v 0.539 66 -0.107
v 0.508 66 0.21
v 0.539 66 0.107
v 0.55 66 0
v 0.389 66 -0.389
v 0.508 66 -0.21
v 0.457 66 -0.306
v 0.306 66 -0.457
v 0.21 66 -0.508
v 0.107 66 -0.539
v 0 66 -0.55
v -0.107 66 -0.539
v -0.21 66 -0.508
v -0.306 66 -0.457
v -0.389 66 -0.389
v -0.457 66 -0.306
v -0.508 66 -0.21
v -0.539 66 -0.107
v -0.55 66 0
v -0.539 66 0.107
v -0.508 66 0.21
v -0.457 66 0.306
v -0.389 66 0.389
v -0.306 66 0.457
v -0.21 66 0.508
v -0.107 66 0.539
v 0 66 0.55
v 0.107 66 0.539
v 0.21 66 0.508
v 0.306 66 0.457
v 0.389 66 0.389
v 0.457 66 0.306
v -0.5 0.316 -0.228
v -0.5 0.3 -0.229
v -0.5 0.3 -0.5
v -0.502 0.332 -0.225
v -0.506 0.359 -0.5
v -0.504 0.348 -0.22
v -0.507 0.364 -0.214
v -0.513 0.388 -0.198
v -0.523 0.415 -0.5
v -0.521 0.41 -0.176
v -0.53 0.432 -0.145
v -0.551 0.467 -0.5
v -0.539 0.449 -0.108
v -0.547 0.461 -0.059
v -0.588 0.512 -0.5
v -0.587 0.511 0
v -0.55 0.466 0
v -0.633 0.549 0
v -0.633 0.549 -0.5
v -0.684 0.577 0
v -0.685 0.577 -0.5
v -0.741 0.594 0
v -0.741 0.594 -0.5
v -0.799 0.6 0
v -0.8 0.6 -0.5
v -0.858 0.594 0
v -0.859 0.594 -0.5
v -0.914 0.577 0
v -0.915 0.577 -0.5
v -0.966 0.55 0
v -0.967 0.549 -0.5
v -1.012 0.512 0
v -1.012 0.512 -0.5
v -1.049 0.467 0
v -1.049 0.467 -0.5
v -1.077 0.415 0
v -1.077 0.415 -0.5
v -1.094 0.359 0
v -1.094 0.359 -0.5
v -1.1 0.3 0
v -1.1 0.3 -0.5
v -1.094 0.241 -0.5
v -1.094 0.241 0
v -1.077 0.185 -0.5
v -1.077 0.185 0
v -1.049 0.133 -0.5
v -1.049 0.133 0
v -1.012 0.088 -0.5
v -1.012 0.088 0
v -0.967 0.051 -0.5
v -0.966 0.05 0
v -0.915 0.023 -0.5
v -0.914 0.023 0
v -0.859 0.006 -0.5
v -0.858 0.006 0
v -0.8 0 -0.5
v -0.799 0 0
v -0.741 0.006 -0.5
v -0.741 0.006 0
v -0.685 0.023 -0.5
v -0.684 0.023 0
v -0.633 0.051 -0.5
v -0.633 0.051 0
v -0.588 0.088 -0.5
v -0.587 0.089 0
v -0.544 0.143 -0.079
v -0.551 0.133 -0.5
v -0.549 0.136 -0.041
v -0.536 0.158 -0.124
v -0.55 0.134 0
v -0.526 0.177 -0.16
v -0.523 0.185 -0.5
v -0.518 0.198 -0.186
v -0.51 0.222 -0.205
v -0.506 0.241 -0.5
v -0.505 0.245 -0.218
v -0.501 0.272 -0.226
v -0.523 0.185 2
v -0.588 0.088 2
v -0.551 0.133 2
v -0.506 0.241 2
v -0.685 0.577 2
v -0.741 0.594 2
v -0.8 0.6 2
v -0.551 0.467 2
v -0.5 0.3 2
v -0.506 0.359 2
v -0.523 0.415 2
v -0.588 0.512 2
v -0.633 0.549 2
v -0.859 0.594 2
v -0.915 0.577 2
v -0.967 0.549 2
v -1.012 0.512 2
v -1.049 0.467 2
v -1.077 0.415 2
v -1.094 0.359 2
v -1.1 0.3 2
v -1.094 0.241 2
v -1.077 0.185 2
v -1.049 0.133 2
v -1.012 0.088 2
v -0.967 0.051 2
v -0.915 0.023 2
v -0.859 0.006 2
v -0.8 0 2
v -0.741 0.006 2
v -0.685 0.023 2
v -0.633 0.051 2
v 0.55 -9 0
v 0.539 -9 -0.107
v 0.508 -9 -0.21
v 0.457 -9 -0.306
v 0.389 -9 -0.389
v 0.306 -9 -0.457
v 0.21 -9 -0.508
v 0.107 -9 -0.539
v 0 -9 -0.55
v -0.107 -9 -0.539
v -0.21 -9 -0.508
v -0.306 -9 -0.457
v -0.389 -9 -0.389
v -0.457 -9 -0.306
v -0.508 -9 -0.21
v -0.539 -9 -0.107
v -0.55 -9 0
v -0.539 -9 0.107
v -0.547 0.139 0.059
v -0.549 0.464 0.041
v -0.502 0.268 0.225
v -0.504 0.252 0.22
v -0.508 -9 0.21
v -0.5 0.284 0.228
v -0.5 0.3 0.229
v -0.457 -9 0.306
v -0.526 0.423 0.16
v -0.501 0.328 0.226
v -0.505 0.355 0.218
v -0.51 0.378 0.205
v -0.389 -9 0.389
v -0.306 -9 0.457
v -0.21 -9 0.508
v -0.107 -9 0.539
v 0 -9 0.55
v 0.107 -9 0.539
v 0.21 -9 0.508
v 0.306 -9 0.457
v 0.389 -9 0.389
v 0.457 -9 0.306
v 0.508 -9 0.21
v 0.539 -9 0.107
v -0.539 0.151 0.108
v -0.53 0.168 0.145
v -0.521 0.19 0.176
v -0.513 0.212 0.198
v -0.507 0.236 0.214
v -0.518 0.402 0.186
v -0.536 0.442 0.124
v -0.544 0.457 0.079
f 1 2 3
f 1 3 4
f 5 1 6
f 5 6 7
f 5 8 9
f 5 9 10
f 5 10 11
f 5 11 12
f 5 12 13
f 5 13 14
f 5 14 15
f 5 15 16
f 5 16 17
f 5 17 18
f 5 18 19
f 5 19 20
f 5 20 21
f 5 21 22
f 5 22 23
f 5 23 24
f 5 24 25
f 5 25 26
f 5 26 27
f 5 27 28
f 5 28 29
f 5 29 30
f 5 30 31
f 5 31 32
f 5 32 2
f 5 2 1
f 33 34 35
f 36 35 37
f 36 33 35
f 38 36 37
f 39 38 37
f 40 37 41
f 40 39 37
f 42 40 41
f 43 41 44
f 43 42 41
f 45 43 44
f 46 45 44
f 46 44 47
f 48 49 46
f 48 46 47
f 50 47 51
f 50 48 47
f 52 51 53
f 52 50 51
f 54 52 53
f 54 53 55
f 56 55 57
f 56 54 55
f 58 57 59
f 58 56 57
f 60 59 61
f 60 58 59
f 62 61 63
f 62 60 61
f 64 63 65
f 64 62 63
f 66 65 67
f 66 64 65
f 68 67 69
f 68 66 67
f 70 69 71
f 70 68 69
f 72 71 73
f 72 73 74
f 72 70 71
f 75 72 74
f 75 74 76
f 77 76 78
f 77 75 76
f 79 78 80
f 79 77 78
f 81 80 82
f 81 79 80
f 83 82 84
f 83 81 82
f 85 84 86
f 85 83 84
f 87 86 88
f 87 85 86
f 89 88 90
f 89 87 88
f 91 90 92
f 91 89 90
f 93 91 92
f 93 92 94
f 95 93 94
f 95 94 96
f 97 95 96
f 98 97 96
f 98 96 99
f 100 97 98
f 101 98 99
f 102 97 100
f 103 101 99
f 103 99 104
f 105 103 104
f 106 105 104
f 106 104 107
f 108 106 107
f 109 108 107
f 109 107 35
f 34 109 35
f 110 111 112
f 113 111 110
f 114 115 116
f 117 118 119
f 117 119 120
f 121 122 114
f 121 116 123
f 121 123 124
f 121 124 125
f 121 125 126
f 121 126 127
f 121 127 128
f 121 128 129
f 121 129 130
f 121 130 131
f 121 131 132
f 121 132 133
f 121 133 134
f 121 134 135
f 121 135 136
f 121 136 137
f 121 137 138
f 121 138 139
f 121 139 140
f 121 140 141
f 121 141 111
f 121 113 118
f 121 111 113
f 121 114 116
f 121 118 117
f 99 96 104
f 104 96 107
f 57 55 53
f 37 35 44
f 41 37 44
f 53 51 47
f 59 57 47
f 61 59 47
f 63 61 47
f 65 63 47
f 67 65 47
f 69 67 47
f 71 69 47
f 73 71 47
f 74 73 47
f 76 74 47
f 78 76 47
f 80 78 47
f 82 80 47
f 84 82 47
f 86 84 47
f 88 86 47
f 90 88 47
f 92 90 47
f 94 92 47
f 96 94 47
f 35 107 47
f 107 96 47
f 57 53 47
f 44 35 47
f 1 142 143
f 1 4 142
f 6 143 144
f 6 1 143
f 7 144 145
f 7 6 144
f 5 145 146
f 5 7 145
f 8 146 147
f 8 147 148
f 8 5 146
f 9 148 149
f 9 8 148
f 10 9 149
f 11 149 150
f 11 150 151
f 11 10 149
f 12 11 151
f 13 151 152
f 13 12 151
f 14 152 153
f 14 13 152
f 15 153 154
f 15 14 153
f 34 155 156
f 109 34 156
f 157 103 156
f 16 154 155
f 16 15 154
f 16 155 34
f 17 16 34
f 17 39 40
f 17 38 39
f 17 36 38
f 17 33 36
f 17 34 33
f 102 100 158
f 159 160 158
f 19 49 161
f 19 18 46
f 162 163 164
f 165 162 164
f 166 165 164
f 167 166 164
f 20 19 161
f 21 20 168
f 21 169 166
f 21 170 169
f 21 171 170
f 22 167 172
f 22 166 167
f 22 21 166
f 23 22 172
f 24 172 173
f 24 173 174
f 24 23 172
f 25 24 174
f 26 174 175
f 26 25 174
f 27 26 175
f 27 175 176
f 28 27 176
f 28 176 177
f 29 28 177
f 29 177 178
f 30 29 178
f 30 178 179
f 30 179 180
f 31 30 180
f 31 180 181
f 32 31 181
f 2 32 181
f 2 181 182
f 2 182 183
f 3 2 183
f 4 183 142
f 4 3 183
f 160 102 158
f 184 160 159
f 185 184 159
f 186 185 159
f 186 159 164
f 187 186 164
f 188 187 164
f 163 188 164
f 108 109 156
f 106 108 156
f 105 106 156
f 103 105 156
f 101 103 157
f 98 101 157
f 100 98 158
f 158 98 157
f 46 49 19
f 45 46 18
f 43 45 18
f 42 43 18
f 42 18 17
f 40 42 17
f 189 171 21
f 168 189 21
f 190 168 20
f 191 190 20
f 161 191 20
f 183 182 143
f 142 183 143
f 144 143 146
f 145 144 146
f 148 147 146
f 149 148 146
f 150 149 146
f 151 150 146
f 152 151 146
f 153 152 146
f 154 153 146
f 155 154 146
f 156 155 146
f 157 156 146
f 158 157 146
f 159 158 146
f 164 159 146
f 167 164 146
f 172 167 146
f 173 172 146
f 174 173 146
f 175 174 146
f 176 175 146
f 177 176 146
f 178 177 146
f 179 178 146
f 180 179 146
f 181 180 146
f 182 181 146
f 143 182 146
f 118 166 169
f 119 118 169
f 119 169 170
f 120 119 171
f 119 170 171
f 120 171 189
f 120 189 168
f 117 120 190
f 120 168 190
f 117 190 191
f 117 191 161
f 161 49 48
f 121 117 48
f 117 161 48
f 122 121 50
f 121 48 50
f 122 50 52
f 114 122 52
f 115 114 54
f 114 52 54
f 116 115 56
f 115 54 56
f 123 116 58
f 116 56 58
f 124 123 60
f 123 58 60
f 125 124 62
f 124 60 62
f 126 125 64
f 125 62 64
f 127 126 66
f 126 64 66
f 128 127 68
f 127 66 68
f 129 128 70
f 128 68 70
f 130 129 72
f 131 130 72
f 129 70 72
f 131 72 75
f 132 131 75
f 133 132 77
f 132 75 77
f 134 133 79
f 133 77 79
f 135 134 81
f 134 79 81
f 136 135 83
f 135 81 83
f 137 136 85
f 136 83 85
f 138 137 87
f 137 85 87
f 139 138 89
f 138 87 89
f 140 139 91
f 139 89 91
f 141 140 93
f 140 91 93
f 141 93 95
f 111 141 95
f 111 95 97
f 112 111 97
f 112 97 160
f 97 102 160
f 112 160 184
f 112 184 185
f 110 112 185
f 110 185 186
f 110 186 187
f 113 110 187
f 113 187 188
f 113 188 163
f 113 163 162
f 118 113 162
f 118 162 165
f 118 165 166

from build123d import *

# Parameters (mm, degrees)
SKETCH1_R           = 0.55
EXTRUDE1_DEPTH      = 66
EXTRUDE1_DEPTH_BACK = 9
SKETCH2_R           = 0.3
EXTRUDE2_DEPTH      = 2
EXTRUDE2_DEPTH_BACK = 0.5


with BuildPart() as part:
    # Sketch1 → Extrude1 (new body, two sides)
    with BuildSketch(Plane(origin=(0, 0, 0), x_dir=(1, 0, 0), z_dir=(0, 1, 0))) as extrude1_sk:
        Circle(SKETCH1_R)
    extrude(amount=EXTRUDE1_DEPTH)
    extrude(extrude1_sk.sketch, amount=-EXTRUDE1_DEPTH_BACK)

    # Sketch2 → Extrude2 (add, two sides)
    with BuildSketch(Plane.XY) as extrude2_sk:
        with Locations((-0.8, 0.3)):
            Circle(SKETCH2_R)
    extrude(amount=EXTRUDE2_DEPTH)
    extrude(extrude2_sk.sketch, amount=-EXTRUDE2_DEPTH_BACK)


solid = part.part
